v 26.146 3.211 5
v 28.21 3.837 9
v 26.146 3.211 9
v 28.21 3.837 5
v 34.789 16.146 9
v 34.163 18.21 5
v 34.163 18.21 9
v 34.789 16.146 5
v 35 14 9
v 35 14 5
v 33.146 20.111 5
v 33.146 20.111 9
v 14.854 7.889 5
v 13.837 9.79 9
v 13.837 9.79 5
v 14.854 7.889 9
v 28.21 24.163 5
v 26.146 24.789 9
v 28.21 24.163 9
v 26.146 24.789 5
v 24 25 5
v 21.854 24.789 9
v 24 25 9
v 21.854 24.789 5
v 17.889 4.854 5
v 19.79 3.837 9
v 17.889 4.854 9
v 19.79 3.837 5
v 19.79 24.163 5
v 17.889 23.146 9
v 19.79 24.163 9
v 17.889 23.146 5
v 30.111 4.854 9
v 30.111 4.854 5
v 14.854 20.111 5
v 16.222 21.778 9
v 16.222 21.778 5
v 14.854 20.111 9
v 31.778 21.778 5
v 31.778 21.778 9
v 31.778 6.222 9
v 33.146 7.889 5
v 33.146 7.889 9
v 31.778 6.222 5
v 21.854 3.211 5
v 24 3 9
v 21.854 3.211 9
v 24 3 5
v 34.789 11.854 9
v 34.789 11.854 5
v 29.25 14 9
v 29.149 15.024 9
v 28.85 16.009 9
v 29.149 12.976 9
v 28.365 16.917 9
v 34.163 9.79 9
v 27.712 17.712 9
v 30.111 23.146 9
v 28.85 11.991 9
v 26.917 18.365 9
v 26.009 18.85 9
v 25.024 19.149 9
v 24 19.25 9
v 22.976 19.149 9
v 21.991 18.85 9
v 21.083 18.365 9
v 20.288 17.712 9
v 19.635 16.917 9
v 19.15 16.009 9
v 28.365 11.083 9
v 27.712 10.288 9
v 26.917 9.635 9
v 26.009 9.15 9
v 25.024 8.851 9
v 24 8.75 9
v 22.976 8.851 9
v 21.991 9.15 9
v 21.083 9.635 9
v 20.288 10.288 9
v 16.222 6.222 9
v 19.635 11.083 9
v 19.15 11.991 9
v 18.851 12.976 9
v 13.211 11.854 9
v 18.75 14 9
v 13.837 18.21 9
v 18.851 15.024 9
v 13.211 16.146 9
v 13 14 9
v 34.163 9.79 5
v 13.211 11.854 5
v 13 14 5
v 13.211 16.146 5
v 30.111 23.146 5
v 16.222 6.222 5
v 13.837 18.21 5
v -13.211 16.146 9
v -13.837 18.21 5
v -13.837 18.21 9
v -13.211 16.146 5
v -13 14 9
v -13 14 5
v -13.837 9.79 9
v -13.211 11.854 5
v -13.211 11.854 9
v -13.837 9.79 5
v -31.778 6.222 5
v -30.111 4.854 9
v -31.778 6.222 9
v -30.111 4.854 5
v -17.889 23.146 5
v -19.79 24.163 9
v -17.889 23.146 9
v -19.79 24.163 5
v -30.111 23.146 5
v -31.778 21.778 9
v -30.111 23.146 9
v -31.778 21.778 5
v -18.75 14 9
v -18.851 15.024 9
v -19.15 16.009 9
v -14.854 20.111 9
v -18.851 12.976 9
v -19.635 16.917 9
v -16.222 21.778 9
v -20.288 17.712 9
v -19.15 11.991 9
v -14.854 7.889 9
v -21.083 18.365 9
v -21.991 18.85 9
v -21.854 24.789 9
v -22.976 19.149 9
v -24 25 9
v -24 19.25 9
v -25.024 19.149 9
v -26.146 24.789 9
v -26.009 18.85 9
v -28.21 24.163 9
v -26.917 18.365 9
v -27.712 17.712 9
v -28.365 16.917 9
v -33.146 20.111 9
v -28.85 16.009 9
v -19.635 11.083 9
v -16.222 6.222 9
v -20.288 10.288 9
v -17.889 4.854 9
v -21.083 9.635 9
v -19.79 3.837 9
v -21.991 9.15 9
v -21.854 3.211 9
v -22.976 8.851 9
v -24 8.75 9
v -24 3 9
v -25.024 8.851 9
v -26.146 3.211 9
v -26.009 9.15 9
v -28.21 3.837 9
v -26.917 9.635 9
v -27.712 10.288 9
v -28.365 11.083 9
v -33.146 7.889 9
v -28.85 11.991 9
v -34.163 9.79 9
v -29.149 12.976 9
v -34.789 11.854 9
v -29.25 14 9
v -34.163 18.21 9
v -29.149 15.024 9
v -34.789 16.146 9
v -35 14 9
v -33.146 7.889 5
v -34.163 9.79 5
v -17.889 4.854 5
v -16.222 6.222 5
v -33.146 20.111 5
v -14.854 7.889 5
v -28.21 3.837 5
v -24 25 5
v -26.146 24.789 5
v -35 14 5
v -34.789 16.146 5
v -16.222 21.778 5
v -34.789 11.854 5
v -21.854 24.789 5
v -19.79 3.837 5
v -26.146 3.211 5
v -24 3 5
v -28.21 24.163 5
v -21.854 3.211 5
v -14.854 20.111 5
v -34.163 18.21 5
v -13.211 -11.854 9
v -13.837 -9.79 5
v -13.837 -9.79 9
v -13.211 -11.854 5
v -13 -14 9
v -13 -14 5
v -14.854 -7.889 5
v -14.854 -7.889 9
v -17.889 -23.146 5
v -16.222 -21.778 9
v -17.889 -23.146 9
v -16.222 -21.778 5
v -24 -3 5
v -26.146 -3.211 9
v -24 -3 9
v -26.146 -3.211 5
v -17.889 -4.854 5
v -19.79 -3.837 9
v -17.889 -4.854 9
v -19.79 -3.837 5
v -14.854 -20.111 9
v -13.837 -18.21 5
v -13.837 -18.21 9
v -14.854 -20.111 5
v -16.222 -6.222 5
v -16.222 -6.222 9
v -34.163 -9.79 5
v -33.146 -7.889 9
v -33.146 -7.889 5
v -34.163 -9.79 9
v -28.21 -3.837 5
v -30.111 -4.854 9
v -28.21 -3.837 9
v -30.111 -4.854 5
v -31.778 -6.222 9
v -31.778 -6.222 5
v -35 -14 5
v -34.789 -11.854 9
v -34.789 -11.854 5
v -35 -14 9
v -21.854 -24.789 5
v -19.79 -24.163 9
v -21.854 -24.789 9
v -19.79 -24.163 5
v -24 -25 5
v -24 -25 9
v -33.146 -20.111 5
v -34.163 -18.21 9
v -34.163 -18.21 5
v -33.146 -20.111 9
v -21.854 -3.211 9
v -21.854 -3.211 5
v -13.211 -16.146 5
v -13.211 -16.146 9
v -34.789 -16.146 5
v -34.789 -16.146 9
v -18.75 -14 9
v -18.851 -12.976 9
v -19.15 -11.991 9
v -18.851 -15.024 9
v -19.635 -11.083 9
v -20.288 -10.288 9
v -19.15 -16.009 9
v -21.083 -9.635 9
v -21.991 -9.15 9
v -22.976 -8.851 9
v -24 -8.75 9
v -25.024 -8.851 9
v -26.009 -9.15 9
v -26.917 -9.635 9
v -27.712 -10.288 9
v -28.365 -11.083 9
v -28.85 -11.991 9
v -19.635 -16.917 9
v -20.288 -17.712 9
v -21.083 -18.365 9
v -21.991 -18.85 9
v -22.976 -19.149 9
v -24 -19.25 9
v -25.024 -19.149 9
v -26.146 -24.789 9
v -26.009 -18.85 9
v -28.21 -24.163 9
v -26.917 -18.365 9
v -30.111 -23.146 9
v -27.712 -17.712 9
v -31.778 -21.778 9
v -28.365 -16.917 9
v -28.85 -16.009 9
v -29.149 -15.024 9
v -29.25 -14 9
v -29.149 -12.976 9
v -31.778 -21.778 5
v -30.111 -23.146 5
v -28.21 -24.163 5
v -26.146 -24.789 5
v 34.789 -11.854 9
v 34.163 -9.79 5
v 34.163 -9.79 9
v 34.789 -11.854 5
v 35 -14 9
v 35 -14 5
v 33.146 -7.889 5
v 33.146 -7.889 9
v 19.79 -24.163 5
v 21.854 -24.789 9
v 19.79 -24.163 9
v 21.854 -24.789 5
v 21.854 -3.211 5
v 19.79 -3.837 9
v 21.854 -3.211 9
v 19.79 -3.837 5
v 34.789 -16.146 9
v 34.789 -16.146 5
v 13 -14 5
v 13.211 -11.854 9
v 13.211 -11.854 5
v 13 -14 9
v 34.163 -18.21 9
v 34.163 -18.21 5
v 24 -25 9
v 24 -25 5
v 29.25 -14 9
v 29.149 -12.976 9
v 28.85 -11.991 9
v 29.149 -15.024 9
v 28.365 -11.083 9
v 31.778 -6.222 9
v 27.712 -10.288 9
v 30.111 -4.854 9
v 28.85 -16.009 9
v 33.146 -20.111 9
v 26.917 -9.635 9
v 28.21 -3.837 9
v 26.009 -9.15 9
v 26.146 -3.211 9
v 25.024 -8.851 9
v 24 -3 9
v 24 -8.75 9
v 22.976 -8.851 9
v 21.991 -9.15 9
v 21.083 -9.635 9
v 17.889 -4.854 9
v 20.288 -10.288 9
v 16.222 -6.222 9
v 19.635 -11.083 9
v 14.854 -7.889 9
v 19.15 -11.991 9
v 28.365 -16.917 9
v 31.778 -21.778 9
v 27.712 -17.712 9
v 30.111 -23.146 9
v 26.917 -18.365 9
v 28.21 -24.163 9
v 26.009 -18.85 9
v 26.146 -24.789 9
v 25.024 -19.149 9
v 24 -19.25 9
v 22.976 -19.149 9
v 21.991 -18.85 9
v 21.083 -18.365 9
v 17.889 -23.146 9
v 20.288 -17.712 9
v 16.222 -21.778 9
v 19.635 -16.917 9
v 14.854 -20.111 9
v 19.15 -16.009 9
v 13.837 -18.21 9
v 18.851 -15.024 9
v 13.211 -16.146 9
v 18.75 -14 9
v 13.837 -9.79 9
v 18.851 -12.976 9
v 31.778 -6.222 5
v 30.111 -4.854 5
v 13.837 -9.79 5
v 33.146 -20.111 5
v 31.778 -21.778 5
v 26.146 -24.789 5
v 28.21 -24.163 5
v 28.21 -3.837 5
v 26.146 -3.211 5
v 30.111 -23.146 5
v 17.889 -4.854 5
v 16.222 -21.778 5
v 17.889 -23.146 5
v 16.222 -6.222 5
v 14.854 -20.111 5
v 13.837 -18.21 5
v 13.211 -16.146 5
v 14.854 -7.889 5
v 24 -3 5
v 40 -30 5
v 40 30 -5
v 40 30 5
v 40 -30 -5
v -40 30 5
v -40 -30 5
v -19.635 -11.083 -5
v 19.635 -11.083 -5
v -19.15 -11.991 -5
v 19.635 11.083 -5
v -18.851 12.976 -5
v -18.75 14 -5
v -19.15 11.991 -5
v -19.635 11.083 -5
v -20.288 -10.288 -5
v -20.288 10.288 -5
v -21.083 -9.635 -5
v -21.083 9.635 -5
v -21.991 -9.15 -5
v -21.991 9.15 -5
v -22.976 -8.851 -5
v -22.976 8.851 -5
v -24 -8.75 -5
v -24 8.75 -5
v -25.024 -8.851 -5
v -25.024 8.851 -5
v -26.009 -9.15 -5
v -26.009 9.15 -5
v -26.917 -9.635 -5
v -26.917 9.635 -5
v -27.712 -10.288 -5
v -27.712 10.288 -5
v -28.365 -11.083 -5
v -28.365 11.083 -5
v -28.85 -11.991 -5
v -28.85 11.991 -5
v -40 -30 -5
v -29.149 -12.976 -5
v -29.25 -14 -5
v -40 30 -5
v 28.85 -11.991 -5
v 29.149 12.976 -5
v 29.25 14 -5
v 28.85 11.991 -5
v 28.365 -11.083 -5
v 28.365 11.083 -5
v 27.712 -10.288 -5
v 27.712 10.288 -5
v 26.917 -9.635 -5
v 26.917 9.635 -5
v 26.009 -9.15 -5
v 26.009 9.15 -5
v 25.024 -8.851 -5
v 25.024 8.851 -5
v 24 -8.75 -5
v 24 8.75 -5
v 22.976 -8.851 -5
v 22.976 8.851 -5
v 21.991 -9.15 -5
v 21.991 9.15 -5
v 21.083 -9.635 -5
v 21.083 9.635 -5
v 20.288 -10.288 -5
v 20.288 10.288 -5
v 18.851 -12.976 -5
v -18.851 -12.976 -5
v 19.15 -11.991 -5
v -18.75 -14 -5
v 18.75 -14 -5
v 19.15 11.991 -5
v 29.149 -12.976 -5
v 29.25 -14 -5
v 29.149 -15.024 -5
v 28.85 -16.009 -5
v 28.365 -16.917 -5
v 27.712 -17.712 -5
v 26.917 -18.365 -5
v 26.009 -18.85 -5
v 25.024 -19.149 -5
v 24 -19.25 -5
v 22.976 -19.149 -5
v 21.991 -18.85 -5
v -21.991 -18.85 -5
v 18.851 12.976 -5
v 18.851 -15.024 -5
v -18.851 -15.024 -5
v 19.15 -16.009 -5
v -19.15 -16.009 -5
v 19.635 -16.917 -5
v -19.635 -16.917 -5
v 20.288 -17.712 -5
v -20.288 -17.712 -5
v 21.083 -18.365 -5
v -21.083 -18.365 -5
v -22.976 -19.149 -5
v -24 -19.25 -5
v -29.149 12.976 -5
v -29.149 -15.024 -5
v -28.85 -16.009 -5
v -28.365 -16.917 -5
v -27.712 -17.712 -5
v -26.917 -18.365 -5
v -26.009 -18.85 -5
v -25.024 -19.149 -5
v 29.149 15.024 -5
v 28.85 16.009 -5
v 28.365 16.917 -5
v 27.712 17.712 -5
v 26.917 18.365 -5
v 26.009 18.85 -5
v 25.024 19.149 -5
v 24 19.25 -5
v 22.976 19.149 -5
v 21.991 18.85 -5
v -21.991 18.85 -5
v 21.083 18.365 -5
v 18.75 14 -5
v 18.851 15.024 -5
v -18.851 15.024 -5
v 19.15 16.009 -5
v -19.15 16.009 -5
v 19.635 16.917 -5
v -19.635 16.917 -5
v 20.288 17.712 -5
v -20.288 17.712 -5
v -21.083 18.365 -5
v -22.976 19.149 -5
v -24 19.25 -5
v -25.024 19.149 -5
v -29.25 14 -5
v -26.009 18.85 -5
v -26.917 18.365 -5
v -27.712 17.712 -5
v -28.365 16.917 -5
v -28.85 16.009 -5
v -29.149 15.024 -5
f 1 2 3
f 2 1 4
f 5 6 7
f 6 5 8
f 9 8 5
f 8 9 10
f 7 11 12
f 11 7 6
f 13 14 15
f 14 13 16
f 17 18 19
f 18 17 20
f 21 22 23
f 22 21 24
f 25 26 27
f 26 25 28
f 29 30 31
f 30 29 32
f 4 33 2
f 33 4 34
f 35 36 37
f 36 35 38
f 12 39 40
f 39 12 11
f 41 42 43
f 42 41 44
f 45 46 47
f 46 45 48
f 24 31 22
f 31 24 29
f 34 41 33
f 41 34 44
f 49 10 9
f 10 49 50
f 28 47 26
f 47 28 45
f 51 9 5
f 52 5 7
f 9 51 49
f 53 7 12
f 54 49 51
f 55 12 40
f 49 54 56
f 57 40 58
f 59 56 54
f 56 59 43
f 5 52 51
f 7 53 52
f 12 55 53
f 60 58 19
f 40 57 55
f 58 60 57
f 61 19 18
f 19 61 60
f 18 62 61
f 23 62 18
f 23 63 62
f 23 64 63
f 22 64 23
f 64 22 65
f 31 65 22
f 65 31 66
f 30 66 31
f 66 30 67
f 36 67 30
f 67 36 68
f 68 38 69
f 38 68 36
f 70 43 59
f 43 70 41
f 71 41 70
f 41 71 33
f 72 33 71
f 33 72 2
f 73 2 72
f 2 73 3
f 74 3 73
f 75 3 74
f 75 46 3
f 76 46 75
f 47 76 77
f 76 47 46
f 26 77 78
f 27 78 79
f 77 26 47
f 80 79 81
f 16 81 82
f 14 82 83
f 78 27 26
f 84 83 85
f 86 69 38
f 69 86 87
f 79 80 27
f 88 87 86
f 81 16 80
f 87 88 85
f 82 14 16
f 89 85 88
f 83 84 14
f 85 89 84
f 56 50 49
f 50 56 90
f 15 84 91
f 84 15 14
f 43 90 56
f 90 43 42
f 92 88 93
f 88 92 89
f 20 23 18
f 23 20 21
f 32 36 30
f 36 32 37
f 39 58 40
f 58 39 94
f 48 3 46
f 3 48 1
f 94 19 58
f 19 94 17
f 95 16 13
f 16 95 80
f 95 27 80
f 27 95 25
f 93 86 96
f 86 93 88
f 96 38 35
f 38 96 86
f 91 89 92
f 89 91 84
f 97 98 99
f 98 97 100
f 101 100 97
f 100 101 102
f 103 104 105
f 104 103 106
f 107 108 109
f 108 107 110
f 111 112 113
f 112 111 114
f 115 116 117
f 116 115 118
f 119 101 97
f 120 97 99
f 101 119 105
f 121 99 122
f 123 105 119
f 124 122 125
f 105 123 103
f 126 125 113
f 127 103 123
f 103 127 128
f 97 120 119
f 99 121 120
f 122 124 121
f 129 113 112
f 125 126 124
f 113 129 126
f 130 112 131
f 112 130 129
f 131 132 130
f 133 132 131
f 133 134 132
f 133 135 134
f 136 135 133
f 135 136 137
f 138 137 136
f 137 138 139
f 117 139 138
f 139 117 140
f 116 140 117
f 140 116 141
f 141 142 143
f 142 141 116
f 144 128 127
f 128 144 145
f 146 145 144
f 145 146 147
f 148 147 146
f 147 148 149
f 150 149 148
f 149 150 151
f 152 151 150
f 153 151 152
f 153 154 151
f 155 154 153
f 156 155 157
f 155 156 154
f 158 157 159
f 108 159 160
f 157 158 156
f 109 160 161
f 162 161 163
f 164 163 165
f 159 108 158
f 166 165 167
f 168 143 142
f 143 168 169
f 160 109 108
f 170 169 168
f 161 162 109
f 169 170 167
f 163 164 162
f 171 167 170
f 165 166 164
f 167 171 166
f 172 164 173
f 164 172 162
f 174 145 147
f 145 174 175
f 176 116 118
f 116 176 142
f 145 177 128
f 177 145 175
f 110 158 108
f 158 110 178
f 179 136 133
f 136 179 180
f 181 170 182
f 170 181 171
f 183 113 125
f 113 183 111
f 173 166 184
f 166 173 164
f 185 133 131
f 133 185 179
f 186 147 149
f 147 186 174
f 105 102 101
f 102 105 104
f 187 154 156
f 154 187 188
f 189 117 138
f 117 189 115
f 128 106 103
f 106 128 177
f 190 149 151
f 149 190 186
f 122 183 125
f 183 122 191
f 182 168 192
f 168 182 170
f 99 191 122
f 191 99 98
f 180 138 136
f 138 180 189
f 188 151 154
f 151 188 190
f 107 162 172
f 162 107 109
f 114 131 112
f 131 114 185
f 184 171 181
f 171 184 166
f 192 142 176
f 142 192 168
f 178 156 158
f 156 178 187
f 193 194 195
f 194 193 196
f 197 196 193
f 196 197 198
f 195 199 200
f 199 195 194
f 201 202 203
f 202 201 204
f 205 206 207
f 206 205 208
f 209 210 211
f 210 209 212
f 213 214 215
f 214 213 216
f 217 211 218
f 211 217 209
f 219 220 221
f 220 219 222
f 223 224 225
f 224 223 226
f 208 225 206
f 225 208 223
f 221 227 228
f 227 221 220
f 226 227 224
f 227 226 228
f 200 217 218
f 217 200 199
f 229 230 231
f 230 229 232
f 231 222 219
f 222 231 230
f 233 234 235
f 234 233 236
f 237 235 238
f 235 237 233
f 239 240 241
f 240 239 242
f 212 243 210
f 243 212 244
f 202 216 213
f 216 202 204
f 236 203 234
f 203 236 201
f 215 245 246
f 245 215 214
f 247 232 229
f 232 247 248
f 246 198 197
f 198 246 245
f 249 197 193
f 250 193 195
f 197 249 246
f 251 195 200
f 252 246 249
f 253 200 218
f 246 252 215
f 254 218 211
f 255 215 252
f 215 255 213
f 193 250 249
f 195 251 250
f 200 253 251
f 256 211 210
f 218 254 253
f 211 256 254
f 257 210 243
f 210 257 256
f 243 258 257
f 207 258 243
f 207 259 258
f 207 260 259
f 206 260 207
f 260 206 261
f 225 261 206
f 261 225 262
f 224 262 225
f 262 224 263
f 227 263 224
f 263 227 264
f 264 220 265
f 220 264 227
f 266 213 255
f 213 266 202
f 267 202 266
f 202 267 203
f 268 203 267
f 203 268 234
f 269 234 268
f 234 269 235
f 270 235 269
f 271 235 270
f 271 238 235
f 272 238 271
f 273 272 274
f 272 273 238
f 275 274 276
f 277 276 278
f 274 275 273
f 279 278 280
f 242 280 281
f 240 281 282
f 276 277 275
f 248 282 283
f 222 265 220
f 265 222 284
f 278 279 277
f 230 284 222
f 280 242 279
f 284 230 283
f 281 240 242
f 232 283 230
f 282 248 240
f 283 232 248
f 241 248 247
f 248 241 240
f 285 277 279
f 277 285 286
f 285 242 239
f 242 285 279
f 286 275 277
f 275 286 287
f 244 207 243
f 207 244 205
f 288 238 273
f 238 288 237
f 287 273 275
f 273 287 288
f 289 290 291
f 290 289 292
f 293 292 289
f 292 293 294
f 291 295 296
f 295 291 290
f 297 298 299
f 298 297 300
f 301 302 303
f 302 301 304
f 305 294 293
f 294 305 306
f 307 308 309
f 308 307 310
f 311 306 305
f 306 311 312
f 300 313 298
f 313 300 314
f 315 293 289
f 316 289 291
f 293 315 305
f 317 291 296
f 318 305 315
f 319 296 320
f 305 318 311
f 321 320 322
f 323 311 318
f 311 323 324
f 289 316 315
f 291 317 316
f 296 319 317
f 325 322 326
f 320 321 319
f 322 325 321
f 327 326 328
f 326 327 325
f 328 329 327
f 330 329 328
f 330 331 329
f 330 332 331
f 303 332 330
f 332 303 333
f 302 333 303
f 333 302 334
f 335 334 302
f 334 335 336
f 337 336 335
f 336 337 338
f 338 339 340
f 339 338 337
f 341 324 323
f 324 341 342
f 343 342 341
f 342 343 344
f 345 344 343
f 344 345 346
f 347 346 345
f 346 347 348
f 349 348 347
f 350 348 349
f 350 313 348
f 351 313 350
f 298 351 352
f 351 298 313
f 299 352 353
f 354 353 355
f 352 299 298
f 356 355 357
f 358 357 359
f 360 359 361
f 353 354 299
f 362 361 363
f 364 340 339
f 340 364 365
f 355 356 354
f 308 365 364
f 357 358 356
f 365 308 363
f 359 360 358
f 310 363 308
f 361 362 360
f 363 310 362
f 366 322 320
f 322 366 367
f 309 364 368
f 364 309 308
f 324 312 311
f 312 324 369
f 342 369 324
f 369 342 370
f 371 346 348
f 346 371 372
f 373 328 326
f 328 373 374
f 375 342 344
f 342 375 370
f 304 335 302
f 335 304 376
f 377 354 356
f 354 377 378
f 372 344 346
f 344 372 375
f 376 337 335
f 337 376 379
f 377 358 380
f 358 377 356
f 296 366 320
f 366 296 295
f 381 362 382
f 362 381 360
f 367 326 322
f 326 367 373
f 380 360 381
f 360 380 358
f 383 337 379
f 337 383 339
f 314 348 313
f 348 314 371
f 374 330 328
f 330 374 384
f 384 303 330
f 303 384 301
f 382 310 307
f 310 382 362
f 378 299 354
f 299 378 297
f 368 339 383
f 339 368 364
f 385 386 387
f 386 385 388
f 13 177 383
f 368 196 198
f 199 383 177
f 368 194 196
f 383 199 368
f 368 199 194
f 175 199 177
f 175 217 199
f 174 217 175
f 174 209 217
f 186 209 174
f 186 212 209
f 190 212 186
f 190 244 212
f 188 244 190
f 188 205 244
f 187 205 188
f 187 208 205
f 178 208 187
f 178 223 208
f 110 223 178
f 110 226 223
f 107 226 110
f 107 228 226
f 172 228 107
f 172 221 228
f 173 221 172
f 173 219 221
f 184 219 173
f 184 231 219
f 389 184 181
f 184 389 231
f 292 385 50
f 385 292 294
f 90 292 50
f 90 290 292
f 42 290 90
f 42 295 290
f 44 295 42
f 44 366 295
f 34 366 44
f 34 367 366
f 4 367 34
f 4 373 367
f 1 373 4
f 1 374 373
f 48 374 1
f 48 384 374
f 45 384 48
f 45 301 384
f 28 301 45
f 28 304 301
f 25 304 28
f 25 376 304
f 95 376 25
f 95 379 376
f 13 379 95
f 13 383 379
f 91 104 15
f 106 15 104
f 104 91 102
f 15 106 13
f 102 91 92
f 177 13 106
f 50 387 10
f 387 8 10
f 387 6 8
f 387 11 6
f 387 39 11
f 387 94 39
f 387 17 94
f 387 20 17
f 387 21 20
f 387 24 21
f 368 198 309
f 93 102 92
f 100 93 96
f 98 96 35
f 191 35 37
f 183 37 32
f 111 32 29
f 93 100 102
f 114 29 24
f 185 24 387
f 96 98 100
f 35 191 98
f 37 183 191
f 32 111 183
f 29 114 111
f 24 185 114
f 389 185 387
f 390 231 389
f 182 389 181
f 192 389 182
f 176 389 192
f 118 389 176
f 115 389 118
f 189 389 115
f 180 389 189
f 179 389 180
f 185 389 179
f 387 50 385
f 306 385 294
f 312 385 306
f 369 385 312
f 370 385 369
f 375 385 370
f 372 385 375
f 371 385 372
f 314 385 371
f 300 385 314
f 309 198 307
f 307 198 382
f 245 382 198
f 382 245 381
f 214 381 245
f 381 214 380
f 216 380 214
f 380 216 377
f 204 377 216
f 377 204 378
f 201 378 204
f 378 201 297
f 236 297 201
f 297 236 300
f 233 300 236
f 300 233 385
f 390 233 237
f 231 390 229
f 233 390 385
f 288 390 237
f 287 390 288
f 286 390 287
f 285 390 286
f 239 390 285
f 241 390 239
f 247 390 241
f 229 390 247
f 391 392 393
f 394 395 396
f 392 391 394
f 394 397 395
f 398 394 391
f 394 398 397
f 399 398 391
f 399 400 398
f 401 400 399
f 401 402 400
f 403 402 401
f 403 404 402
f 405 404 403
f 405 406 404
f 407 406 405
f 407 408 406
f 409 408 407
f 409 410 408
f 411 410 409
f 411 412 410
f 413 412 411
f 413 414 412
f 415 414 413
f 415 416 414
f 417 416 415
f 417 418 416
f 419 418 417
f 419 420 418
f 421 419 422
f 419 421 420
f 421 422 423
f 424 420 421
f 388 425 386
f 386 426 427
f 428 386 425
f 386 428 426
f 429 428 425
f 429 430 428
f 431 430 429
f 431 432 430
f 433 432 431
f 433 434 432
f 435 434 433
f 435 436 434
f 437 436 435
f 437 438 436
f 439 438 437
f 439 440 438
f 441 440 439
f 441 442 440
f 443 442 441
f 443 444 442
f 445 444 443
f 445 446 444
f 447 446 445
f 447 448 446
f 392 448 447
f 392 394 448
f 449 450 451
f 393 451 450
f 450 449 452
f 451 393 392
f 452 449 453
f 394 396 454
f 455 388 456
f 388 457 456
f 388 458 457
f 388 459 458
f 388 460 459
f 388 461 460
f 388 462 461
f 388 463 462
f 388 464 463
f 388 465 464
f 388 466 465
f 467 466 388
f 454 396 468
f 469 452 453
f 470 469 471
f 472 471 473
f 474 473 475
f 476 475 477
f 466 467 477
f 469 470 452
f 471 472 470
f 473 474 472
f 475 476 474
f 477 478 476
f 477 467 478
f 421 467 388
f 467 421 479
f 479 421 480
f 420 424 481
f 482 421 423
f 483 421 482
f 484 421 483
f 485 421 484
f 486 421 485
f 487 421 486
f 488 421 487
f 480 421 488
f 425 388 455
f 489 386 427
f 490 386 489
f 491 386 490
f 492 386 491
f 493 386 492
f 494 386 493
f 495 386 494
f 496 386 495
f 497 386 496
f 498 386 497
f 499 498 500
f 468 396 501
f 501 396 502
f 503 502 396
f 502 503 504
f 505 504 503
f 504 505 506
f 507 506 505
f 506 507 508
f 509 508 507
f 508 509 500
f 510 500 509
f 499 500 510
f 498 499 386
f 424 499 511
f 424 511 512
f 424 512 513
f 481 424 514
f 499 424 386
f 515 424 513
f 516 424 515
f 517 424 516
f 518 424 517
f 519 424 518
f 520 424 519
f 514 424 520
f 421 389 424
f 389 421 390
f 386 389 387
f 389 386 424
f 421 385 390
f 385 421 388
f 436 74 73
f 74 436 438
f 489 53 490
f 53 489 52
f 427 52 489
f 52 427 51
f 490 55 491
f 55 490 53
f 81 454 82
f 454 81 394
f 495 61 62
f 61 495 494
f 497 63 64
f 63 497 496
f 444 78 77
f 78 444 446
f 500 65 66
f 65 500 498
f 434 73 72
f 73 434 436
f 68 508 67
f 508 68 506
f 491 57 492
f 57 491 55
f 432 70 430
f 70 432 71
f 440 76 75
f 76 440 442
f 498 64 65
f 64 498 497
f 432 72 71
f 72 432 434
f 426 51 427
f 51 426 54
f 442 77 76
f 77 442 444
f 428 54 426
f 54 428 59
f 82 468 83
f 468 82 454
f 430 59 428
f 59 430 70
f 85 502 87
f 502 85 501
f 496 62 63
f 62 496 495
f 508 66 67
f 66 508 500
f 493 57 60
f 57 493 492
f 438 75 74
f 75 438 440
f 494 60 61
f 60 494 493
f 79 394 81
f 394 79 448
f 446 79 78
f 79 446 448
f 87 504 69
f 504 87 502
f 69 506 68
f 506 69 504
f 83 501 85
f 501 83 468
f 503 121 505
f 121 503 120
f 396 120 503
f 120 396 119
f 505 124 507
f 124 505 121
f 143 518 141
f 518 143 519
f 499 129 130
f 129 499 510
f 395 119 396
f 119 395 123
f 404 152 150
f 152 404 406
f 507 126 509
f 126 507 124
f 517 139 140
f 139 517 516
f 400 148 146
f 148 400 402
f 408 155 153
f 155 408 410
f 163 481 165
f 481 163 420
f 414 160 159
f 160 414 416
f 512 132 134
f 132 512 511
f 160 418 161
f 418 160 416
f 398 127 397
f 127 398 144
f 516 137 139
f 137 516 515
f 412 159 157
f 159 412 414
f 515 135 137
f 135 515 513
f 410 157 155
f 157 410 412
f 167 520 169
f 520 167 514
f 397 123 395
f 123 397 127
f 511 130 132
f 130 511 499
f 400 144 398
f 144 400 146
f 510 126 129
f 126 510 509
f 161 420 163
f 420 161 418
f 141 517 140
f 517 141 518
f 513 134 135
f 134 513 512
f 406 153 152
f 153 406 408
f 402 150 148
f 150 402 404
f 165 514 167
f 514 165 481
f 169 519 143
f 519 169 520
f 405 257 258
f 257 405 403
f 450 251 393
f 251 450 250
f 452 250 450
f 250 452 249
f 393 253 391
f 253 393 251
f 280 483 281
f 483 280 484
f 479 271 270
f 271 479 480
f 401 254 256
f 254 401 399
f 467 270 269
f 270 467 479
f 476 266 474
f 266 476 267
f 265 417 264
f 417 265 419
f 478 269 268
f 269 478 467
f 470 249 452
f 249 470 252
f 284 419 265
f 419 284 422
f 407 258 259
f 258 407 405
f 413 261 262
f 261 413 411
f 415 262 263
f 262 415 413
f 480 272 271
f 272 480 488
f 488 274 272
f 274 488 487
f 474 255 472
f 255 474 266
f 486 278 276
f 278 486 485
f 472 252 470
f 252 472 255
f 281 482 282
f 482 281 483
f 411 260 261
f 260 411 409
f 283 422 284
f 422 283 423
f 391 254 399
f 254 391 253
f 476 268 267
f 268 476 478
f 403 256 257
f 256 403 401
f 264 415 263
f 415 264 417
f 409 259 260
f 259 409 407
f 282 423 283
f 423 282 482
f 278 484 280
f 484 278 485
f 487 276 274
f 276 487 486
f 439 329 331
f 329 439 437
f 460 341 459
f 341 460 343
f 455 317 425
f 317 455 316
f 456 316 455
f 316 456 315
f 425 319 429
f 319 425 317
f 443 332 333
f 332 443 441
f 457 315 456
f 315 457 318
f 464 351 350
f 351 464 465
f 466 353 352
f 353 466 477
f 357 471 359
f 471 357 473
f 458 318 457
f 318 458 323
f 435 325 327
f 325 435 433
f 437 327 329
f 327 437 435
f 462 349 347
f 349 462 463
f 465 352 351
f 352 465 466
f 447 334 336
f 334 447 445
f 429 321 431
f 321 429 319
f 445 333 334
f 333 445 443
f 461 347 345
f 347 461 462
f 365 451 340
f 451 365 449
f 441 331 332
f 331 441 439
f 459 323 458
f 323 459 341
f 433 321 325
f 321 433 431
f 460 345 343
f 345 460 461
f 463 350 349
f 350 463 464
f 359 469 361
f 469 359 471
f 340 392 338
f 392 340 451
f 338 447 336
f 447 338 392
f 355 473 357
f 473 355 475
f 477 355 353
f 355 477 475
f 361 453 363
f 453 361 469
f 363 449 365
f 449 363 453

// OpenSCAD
$fn = 32;

// ----------------------------------------------------------------------
// Anchor pads 80 x 60 x 14
// four corner bosses with anchor holes
// ----------------------------------------------------------------------

// --- parameters (mm) ---
plate = [80, 60, 10];  // base plate size (x, y, z)
pads = 4;              // boss count, one per corner
edge = 16;             // boss centre offset from the plate edge
boss_d = 22;           // boss diameter
boss_h = 4;            // boss height above the base plate
hole_d = 10.5;         // hole diameter

// --- derived feature positions (mm) ---
height = plate[2] + boss_h;      // = 14   overall height of the part
corner_x = plate[0] / 2 - edge;  // = 24   boss centre X
corner_y = plate[1] / 2 - edge;  // = 14   boss centre Y
feature_centers = [
  [corner_x, corner_y],
  [-corner_x, corner_y],
  [-corner_x, -corner_y],
  [corner_x, -corner_y]
];   // boss centres, anchor holes are drilled there

// base plate, four bosses standing on it, anchor holes all the way through
difference() {
  union() {
    cube(plate, center = true);
    for (centre = feature_centers)
      translate([centre[0], centre[1], plate[2] / 2 - 1])
        cylinder(d = boss_d, h = boss_h + 1);
  }
  for (centre = feature_centers)
    translate([centre[0], centre[1], -height])
      cylinder(d = hole_d, h = 2 * height + 2);  // through boss and plate
}
